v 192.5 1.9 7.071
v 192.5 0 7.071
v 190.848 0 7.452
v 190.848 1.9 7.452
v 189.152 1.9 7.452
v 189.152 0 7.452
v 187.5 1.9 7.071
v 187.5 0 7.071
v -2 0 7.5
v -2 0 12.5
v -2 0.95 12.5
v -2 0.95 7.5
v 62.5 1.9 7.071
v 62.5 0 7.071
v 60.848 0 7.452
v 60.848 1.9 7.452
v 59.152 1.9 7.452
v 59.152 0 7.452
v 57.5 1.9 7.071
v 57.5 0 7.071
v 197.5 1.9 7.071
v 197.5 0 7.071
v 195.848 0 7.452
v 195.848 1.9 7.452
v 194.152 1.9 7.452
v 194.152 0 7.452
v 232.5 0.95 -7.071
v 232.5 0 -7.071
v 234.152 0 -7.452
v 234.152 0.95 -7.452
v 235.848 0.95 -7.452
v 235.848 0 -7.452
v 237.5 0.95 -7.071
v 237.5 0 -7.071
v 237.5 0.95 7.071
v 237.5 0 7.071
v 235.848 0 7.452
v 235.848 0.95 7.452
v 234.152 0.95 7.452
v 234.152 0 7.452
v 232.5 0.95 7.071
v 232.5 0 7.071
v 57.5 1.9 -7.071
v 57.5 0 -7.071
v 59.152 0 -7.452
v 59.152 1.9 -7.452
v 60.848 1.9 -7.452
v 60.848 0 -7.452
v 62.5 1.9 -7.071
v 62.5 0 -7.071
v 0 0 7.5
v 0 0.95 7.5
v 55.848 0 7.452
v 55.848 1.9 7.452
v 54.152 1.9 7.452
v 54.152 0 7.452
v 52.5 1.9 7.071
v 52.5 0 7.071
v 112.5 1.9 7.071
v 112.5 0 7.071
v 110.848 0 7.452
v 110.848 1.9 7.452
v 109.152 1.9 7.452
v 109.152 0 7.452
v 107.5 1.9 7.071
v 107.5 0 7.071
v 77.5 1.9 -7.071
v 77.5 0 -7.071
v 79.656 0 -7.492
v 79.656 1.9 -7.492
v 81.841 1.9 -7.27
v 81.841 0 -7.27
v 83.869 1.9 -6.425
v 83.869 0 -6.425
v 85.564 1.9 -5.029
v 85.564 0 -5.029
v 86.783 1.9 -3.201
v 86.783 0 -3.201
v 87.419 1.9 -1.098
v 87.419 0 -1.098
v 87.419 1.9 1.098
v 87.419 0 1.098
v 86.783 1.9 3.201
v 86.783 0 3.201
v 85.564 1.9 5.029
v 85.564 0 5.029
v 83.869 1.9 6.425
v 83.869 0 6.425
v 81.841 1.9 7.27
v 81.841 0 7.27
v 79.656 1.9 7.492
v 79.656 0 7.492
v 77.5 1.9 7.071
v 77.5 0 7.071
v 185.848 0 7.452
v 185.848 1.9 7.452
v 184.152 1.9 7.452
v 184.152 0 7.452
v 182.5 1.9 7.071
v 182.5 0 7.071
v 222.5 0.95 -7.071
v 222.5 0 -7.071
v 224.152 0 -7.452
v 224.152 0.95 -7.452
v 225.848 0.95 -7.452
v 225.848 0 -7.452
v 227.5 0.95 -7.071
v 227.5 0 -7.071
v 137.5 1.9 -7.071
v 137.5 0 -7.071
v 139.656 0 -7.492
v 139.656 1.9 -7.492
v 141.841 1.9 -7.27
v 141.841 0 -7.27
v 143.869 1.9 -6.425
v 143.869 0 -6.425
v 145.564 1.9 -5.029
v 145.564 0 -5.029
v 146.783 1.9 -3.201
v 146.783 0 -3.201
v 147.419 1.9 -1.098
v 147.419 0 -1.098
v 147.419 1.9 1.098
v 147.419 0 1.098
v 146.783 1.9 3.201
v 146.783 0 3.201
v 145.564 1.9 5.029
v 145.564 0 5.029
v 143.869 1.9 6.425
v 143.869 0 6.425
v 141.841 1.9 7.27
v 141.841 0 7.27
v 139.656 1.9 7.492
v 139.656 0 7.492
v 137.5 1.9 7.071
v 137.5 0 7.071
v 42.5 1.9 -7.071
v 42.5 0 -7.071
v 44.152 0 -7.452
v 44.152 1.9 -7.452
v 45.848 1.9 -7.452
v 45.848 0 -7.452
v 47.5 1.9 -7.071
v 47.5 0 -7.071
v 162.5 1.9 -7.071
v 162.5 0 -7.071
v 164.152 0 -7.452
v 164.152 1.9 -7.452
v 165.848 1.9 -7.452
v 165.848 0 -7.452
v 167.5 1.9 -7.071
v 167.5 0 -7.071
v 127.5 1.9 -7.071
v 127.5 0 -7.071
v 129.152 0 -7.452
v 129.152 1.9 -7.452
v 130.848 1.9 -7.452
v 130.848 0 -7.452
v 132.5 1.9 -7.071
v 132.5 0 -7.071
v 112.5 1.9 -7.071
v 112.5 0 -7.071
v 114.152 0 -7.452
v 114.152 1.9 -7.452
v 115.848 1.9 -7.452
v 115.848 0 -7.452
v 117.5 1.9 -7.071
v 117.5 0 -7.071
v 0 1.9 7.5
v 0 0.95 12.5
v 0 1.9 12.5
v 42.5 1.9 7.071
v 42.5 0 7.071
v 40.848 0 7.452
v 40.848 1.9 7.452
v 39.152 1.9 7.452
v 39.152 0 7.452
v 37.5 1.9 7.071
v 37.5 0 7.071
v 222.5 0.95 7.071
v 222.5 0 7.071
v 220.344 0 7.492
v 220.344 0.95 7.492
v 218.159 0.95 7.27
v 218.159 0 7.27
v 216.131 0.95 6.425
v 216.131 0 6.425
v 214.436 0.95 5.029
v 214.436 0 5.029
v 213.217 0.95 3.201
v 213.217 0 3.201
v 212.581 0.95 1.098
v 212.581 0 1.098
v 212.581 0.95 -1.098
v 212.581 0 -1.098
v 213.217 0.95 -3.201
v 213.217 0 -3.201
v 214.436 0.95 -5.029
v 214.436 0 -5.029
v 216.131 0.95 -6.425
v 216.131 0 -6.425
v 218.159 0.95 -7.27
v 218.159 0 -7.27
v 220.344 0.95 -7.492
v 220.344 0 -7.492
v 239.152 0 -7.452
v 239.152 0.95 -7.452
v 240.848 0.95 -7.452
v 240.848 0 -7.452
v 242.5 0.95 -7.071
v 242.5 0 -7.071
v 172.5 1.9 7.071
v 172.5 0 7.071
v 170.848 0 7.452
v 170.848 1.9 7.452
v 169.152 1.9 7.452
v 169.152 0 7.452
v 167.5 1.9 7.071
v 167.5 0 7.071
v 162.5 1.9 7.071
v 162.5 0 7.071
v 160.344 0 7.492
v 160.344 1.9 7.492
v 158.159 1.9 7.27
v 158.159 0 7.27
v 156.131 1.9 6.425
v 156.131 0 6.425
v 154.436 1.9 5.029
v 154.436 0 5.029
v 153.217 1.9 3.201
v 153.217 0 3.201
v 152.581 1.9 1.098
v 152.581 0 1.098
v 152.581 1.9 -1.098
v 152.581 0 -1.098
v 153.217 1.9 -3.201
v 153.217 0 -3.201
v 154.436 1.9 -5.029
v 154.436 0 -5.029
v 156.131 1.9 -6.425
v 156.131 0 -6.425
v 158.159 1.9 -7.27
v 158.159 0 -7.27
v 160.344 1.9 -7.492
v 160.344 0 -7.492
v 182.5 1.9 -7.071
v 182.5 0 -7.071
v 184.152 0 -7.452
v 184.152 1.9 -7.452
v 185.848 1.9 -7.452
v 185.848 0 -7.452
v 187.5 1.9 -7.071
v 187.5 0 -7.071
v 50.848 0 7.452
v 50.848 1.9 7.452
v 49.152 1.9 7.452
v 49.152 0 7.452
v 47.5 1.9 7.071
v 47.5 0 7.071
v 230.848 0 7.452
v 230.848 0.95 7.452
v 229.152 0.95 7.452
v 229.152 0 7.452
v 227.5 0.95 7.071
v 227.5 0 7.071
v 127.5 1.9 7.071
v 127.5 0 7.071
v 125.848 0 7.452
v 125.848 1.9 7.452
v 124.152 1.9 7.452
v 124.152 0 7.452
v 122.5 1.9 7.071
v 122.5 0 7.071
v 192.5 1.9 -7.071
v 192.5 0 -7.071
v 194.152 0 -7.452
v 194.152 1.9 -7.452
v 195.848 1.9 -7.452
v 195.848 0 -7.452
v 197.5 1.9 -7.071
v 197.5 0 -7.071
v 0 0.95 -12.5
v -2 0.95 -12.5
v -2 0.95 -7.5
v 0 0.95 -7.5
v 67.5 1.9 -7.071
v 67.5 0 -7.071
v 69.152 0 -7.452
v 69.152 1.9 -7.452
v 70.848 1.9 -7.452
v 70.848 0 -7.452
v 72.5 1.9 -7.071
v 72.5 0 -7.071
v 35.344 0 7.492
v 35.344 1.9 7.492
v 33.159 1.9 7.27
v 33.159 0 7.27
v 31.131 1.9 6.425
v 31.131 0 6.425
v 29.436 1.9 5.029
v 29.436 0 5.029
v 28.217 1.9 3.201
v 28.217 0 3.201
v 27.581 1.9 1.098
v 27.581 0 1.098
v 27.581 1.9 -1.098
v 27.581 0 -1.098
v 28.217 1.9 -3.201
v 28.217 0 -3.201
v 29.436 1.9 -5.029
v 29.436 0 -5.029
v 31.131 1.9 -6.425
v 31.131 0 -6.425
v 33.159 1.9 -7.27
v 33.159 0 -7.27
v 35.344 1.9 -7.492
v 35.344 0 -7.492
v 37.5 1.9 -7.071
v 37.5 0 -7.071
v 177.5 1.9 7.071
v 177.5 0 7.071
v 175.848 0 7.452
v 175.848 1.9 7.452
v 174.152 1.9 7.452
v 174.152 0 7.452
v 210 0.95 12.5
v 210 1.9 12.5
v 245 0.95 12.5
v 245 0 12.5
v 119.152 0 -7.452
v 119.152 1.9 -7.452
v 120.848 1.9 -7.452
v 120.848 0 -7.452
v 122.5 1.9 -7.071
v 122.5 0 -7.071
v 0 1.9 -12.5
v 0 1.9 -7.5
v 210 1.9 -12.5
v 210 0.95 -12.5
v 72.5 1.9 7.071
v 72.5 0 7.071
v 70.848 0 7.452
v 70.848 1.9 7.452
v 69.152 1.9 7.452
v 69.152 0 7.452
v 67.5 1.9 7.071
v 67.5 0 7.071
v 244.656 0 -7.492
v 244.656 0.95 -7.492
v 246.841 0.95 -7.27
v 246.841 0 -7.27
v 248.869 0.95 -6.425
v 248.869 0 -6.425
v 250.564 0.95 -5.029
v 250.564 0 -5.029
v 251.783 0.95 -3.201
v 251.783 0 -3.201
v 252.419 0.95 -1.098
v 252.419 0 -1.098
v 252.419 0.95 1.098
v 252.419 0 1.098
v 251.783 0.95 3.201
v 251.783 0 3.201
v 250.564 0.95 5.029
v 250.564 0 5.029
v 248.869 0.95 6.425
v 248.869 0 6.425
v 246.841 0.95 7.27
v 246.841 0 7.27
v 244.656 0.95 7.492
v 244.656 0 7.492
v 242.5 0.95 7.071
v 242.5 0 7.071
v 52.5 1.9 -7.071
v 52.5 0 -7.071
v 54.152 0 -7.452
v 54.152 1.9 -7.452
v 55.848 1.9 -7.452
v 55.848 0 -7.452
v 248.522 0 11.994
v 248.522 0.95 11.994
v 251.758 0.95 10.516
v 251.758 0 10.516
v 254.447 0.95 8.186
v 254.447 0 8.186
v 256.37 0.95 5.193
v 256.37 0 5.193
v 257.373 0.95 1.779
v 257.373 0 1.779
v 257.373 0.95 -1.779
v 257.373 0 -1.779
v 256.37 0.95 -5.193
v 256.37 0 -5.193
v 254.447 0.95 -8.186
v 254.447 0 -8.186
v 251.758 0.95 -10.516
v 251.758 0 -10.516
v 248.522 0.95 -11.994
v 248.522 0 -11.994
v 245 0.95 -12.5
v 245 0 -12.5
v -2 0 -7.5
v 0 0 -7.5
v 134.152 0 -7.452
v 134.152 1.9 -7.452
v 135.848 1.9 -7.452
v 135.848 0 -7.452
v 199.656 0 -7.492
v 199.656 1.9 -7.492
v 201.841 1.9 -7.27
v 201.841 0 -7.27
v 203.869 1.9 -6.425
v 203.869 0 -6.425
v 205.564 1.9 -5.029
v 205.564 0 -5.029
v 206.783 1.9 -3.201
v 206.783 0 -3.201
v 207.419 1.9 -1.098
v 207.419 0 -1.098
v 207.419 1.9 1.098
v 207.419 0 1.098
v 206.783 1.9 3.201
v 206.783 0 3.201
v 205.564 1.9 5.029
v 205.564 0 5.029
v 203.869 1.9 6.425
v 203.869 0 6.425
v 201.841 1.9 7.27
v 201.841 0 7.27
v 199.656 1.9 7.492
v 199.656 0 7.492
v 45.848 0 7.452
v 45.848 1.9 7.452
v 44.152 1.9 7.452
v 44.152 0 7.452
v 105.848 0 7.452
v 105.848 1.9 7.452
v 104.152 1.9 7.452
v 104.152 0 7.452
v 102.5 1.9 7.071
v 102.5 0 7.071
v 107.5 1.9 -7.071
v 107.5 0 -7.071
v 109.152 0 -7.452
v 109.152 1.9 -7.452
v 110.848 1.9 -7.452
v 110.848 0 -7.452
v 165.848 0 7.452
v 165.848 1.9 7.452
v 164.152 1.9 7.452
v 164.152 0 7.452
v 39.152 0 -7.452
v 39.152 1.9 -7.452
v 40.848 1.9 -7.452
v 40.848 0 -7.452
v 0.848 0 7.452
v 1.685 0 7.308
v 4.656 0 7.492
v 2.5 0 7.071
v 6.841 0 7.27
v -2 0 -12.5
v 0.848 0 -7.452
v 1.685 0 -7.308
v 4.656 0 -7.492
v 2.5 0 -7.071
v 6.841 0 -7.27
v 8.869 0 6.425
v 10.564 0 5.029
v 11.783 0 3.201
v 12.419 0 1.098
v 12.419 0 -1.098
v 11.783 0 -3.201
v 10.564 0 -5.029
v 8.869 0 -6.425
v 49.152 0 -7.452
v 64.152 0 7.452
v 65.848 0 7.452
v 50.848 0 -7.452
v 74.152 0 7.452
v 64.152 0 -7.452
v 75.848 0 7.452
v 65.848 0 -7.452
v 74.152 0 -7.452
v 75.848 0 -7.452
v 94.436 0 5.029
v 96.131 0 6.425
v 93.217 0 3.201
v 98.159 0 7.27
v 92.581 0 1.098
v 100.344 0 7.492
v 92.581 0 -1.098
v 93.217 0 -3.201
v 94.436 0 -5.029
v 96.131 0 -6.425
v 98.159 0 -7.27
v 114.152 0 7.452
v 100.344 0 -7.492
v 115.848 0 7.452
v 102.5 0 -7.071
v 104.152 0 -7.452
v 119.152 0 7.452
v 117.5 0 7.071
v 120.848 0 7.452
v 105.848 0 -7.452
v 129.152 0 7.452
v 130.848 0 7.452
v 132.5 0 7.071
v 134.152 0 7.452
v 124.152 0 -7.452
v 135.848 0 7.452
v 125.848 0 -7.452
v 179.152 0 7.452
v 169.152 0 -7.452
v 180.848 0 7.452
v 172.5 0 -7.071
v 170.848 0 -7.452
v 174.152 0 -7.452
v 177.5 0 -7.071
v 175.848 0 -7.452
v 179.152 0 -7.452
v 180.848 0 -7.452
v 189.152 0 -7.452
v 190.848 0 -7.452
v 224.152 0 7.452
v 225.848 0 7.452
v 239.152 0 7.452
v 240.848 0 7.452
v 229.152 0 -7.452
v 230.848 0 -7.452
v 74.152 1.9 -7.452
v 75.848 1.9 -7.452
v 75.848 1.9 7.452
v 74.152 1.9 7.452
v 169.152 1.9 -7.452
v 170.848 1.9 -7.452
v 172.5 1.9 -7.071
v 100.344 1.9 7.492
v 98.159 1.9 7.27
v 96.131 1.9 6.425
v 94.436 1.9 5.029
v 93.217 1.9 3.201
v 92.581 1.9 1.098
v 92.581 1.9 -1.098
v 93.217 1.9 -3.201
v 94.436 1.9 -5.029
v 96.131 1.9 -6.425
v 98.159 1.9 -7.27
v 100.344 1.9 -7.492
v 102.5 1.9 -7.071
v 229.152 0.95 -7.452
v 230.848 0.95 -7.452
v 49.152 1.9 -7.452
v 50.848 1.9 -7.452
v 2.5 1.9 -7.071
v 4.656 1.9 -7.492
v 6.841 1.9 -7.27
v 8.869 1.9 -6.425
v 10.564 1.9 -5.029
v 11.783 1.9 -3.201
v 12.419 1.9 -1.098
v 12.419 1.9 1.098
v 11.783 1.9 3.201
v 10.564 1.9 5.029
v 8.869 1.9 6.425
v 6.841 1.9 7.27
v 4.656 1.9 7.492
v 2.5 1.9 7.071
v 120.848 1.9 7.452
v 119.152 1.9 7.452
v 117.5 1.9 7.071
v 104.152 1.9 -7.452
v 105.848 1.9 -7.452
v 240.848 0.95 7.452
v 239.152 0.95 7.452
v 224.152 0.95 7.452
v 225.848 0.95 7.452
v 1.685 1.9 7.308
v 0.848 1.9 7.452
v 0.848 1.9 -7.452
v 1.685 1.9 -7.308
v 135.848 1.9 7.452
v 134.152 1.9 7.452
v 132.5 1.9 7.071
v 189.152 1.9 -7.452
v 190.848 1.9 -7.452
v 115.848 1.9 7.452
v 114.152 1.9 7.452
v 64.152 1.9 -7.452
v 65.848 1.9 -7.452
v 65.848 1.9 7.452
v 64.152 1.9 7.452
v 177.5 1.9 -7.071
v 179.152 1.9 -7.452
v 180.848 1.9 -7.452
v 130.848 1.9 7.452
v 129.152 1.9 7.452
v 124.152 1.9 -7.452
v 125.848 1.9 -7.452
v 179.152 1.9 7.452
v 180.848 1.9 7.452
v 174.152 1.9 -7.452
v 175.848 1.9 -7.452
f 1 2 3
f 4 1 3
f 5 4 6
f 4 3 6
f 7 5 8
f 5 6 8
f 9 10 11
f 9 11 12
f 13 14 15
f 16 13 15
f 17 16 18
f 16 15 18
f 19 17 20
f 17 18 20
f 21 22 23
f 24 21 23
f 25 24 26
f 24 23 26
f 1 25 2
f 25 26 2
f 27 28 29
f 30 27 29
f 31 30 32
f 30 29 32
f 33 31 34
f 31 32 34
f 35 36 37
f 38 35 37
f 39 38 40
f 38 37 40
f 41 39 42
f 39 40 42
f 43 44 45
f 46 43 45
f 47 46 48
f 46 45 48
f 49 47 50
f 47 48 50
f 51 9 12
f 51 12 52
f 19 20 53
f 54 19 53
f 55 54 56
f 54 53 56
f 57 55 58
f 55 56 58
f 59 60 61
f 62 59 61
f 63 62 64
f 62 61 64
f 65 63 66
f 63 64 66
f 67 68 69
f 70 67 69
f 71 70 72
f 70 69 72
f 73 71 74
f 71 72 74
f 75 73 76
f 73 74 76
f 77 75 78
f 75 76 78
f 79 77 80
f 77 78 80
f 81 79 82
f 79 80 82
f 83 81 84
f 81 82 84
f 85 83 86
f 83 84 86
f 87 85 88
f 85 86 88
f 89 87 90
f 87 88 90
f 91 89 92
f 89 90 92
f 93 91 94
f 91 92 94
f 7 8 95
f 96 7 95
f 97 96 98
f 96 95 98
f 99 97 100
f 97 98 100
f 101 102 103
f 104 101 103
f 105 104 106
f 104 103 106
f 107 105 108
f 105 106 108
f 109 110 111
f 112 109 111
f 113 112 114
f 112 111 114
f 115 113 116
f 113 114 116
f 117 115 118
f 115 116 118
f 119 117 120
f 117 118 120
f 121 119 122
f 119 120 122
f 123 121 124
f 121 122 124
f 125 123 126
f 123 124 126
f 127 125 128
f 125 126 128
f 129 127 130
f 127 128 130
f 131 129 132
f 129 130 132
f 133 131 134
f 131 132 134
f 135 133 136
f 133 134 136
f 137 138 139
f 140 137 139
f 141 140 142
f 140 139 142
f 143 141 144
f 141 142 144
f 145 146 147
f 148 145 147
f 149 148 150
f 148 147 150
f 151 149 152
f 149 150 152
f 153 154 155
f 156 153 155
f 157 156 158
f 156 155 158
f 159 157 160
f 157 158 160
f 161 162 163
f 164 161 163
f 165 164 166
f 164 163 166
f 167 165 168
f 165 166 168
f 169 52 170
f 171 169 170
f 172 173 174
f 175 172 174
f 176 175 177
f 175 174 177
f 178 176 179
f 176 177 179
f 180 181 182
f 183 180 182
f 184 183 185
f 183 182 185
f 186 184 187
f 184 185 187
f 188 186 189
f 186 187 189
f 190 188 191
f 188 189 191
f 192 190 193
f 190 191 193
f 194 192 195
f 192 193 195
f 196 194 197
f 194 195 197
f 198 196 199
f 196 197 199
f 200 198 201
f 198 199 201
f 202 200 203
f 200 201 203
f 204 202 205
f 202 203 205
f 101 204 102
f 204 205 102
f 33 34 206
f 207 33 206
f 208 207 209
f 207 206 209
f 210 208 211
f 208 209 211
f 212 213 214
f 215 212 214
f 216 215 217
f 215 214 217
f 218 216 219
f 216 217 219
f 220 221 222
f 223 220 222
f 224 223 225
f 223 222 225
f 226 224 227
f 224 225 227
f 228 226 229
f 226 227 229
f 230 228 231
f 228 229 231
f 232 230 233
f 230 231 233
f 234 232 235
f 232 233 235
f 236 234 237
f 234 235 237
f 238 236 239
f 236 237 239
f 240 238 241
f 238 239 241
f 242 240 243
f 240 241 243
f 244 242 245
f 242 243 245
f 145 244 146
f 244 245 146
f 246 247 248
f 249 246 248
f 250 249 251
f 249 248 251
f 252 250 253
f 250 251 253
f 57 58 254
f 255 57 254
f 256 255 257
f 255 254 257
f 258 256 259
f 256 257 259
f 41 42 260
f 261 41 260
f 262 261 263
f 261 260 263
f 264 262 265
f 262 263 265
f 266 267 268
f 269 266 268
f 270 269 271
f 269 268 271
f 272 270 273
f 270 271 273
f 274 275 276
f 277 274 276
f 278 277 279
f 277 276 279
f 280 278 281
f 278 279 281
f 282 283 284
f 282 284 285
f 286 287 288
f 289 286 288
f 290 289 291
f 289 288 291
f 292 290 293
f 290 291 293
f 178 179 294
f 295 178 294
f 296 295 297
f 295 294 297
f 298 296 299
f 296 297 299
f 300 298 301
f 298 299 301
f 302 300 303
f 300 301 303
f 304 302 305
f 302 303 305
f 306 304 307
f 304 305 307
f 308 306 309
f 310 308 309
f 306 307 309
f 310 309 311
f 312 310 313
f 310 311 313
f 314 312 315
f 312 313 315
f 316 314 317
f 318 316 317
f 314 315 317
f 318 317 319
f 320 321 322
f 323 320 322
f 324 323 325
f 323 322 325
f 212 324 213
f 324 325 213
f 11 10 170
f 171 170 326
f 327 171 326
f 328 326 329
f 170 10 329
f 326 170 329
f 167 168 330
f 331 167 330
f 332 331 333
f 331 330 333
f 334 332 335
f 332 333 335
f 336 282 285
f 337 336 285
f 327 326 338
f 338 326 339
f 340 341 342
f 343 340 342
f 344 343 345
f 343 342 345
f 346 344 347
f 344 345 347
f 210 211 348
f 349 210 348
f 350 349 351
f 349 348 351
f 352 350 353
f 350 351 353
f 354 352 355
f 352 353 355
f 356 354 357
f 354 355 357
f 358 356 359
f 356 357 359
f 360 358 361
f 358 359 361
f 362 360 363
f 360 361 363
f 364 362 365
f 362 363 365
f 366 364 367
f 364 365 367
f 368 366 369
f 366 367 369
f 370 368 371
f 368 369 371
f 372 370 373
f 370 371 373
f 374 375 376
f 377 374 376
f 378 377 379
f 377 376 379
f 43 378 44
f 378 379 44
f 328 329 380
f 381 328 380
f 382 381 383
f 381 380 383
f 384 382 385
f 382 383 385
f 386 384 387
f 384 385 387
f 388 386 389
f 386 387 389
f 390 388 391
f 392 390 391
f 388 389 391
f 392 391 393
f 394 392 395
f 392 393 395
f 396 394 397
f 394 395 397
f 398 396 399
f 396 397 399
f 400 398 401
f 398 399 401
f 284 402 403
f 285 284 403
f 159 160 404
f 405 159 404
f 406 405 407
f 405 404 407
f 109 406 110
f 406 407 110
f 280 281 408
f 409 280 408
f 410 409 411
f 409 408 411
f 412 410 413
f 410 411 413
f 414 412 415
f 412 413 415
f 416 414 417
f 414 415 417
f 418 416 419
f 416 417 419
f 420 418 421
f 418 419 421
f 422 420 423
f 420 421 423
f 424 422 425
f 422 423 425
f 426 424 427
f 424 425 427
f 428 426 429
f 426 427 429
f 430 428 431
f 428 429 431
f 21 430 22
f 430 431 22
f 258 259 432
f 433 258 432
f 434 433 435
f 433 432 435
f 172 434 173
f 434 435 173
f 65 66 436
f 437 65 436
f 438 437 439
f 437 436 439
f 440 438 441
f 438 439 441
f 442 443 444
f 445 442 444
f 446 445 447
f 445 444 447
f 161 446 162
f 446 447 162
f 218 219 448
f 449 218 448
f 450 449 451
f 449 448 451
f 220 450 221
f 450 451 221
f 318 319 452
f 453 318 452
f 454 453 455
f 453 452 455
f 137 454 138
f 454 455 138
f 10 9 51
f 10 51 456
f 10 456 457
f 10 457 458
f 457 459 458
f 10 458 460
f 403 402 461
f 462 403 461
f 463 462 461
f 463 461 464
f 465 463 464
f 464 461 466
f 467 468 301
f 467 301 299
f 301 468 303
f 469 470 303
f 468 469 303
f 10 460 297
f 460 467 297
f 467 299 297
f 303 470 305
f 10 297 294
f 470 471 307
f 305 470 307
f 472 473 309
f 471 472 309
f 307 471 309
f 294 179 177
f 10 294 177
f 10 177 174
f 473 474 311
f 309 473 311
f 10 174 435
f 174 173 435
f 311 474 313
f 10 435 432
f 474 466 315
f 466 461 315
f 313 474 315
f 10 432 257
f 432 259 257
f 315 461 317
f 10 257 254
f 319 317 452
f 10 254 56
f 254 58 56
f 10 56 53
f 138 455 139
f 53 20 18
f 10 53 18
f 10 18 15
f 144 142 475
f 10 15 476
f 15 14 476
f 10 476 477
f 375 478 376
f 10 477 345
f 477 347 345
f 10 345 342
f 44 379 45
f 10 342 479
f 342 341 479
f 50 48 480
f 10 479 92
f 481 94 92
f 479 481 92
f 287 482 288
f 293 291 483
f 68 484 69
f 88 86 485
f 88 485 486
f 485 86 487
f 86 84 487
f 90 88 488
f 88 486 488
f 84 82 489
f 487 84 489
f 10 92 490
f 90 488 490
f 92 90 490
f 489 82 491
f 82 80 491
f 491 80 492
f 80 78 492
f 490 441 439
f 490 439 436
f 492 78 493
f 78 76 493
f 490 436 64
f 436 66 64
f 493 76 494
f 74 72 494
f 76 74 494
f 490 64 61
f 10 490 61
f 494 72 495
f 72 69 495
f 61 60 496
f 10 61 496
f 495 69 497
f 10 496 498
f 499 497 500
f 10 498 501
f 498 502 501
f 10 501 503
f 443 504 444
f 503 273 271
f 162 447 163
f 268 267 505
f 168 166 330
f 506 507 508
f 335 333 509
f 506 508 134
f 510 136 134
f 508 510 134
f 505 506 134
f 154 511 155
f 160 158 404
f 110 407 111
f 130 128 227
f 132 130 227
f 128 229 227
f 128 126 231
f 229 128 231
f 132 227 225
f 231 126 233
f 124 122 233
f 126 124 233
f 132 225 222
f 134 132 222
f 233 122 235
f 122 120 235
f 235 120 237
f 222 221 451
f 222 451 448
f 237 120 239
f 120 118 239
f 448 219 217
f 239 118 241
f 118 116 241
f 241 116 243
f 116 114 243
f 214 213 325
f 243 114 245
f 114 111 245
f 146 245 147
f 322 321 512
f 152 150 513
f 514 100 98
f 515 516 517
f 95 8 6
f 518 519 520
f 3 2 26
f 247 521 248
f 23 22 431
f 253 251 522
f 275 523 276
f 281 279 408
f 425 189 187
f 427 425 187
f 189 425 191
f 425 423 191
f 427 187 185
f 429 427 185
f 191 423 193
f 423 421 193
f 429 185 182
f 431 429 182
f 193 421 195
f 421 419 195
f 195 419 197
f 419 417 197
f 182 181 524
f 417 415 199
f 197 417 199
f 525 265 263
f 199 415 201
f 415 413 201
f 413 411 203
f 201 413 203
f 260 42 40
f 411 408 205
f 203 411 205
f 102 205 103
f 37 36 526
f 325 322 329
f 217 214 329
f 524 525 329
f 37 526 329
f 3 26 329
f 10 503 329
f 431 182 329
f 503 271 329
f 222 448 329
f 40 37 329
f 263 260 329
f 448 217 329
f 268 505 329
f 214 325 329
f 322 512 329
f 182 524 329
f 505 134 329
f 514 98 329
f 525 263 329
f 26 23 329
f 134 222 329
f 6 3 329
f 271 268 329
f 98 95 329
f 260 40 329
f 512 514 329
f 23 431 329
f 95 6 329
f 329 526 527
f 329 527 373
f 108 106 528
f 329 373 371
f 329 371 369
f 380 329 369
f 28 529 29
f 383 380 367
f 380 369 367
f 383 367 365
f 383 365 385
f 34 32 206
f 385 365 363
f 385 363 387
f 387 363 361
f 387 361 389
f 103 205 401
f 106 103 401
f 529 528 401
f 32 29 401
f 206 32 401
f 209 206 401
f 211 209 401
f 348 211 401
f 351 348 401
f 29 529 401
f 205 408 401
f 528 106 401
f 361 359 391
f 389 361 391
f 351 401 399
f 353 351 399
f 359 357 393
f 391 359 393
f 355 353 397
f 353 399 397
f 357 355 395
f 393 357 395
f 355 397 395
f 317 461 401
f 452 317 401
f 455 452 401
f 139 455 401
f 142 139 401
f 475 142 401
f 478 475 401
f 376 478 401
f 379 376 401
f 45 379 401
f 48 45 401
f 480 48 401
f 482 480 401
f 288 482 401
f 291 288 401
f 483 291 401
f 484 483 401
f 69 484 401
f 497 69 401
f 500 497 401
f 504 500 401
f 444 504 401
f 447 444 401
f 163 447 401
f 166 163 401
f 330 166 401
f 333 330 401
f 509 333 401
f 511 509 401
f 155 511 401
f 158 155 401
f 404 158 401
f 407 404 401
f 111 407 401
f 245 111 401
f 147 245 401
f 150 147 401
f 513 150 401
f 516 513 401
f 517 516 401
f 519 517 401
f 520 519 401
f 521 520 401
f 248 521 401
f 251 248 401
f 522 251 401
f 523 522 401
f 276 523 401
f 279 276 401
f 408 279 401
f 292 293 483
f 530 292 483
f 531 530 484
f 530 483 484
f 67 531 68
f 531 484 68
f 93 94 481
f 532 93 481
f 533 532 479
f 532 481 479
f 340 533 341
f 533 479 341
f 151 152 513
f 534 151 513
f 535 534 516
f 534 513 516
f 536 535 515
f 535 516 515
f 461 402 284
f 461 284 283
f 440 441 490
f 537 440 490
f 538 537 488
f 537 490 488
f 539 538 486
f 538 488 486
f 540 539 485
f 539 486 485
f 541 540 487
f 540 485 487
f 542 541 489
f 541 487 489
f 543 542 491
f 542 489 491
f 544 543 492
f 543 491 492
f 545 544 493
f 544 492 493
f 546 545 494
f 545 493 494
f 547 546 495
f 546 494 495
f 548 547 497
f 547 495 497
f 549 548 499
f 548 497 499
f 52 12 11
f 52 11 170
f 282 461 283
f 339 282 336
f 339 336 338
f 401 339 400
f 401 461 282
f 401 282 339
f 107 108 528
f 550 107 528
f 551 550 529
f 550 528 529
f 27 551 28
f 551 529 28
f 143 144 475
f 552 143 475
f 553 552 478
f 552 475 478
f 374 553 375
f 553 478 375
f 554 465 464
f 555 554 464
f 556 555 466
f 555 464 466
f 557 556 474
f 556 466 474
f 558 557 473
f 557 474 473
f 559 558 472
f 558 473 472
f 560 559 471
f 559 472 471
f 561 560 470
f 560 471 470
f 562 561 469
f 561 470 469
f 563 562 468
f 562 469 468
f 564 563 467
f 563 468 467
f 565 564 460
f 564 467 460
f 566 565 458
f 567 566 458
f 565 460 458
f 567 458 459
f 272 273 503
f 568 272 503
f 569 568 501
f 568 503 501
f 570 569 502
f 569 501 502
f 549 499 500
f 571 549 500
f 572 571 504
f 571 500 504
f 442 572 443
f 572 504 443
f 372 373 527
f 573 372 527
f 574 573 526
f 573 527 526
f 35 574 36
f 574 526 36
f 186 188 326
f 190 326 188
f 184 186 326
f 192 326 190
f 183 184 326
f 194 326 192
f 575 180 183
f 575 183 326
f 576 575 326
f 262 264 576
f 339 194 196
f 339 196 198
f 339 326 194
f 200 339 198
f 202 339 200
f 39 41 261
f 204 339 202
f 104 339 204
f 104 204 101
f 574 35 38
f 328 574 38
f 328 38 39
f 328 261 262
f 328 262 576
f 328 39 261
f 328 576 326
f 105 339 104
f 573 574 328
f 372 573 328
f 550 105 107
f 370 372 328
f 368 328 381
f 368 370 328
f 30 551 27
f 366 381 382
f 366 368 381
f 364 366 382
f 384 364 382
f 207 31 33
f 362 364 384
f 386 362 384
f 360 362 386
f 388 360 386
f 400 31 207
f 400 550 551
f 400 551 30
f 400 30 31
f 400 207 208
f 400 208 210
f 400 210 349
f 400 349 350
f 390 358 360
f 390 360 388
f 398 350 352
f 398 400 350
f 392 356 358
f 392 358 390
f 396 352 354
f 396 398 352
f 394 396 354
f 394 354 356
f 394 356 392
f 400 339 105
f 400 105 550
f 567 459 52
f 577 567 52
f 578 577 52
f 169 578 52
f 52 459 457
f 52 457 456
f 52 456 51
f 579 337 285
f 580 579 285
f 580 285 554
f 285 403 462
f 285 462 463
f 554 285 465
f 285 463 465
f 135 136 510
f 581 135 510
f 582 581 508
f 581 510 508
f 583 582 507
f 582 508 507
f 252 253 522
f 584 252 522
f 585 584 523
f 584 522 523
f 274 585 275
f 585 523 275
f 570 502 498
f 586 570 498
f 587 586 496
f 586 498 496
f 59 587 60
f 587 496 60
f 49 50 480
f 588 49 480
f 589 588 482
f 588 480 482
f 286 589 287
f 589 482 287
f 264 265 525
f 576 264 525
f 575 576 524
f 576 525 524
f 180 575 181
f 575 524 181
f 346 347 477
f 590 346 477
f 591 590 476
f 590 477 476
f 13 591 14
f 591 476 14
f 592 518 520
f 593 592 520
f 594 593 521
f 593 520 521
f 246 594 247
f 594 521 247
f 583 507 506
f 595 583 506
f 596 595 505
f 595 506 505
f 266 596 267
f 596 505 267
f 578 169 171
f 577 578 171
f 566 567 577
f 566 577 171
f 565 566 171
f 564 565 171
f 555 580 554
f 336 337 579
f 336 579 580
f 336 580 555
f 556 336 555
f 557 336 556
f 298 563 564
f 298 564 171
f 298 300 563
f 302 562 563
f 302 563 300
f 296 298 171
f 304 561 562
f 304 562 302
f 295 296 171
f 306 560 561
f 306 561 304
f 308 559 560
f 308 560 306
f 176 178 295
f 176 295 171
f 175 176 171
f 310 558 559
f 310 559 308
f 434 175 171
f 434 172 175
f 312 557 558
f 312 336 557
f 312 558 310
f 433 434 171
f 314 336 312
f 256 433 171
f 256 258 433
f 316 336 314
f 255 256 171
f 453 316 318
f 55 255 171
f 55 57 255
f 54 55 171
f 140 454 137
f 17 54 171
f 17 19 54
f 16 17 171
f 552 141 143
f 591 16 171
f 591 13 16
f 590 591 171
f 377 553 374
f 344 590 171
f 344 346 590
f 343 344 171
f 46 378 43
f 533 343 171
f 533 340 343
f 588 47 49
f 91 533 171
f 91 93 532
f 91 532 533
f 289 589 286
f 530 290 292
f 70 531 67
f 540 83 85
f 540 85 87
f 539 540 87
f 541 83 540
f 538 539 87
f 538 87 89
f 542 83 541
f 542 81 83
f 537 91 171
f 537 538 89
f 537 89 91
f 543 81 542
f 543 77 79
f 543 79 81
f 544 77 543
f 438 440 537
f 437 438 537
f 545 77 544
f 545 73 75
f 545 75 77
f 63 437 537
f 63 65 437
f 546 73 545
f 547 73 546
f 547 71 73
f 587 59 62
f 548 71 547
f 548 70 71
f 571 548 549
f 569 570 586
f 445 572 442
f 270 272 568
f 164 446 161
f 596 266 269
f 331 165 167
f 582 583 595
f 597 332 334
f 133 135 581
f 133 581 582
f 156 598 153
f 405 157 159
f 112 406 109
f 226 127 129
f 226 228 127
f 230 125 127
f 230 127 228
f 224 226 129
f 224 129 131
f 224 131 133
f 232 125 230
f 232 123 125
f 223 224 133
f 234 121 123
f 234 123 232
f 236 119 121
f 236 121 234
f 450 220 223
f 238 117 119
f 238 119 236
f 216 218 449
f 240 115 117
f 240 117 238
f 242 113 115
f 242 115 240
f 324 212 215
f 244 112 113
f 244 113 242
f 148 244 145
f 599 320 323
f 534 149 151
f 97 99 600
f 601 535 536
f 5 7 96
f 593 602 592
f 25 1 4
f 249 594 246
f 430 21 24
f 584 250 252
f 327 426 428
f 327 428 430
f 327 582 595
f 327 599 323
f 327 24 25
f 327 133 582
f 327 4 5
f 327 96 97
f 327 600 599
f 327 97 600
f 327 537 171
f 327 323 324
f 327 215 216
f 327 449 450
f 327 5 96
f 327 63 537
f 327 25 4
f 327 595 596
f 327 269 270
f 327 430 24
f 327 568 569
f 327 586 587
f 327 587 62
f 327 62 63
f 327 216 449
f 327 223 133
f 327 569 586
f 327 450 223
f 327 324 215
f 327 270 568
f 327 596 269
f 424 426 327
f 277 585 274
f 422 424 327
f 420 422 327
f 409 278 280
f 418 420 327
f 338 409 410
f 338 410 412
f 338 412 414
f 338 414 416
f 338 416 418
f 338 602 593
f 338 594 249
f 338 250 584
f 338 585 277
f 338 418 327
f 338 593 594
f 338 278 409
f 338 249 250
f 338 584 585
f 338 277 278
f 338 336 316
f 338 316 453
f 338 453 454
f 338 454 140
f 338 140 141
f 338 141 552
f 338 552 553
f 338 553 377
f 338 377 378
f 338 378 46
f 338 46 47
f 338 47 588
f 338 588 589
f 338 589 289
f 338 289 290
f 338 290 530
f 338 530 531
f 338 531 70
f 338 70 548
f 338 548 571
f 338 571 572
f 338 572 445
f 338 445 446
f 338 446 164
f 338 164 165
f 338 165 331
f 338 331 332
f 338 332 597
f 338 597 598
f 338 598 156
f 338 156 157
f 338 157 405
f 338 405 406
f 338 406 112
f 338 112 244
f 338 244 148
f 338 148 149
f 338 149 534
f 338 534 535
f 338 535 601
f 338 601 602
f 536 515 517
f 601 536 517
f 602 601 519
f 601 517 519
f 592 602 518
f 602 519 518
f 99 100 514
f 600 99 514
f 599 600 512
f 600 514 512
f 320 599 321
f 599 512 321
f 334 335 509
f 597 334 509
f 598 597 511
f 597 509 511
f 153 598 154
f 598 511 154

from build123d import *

# Parameters (mm, degrees)
BOSS_EXTRUDE1_DEPTH = 1.9
BOSS_EXTRUDE3_DEPTH = 0.95
SKETCH2_W           = 2
SKETCH2_H           = 5
BOSS_EXTRUDE2_DEPTH = 0.95


with BuildPart() as part:
    # Sketch1 → Boss-Extrude1 (new body)
    with BuildSketch(Plane(origin=(0, 0, 0), x_dir=(1, 0, 0), z_dir=(0, 1, 0))):
        with BuildLine():
            Line((0, -7.5), (0, -12.5))
            Line((0, -12.5), (210, -12.5))
            Line((210, -12.5), (210, 12.5))
            Line((210, 12.5), (0, 12.5))
            Line((0, 12.5), (0, 7.5))
            ThreePointArc((0, 7.5), (1.26826484, 7.391989197), (2.5, 7.071067812))
            ThreePointArc((2.5, 7.071067812), (12.5, 0), (2.5, -7.071067812))
            ThreePointArc((2.5, -7.071067812), (1.26826484, -7.391989197), (0, -7.5))
        make_face()
        with BuildLine():
            ThreePointArc((37.5, 7.071067812), (40, 7.5), (42.5, 7.071067812))
            ThreePointArc((42.5, 7.071067812), (45, 7.5), (47.5, 7.071067812))
            ThreePointArc((47.5, 7.071067812), (50, 7.5), (52.5, 7.071067812))
            ThreePointArc((52.5, 7.071067812), (55, 7.5), (57.5, 7.071067812))
            ThreePointArc((57.5, 7.071067812), (60, 7.5), (62.5, 7.071067812))
            ThreePointArc((62.5, 7.071067812), (65, 7.5), (67.5, 7.071067812))
            ThreePointArc((67.5, 7.071067812), (70, 7.5), (72.5, 7.071067812))
            ThreePointArc((72.5, 7.071067812), (75, 7.5), (77.5, 7.071067812))
            ThreePointArc((77.5, 7.071067812), (87.5, 0), (77.5, -7.071067812))
            ThreePointArc((77.5, -7.071067812), (75, -7.5), (72.5, -7.071067812))
            ThreePointArc((72.5, -7.071067812), (70, -7.5), (67.5, -7.071067812))
            ThreePointArc((67.5, -7.071067812), (65, -7.5), (62.5, -7.071067812))
            ThreePointArc((62.5, -7.071067812), (60, -7.5), (57.5, -7.071067812))
            ThreePointArc((57.5, -7.071067812), (55, -7.5), (52.5, -7.071067812))
            ThreePointArc((52.5, -7.071067812), (50, -7.5), (47.5, -7.071067812))
            ThreePointArc((47.5, -7.071067812), (45, -7.5), (42.5, -7.071067812))
            ThreePointArc((42.5, -7.071067812), (40, -7.5), (37.5, -7.071067812))
            ThreePointArc((37.5, -7.071067812), (27.5, 0), (37.5, 7.071067812))
        make_face(mode=Mode.SUBTRACT)
        with BuildLine():
            ThreePointArc((102.5, 7.071067812), (105, 7.5), (107.5, 7.071067812))
            ThreePointArc((107.5, 7.071067812), (110, 7.5), (112.5, 7.071067812))
            ThreePointArc((112.5, 7.071067812), (115, 7.5), (117.5, 7.071067812))
            ThreePointArc((117.5, 7.071067812), (120, 7.5), (122.5, 7.071067812))
            ThreePointArc((122.5, 7.071067812), (125, 7.5), (127.5, 7.071067812))
            ThreePointArc((127.5, 7.071067812), (130, 7.5), (132.5, 7.071067812))
            ThreePointArc((132.5, 7.071067812), (135, 7.5), (137.5, 7.071067812))
            ThreePointArc((137.5, 7.071067812), (147.5, 0), (137.5, -7.071067812))
            ThreePointArc((137.5, -7.071067812), (135, -7.5), (132.5, -7.071067812))
            ThreePointArc((132.5, -7.071067812), (130, -7.5), (127.5, -7.071067812))
            ThreePointArc((127.5, -7.071067812), (125, -7.5), (122.5, -7.071067812))
            ThreePointArc((122.5, -7.071067812), (120, -7.5), (117.5, -7.071067812))
            ThreePointArc((117.5, -7.071067812), (115, -7.5), (112.5, -7.071067812))
            ThreePointArc((112.5, -7.071067812), (110, -7.5), (107.5, -7.071067812))
            ThreePointArc((107.5, -7.071067812), (105, -7.5), (102.5, -7.071067812))
            ThreePointArc((102.5, -7.071067812), (92.5, 0), (102.5, 7.071067812))
        make_face(mode=Mode.SUBTRACT)
        with BuildLine():
            ThreePointArc((162.5, 7.071067812), (165, 7.5), (167.5, 7.071067812))
            ThreePointArc((167.5, 7.071067812), (170, 7.5), (172.5, 7.071067812))
            ThreePointArc((172.5, 7.071067812), (175, 7.5), (177.5, 7.071067812))
            ThreePointArc((177.5, 7.071067812), (180, 7.5), (182.5, 7.071067812))
            ThreePointArc((182.5, 7.071067812), (185, 7.5), (187.5, 7.071067812))
            ThreePointArc((187.5, 7.071067812), (190, 7.5), (192.5, 7.071067812))
            ThreePointArc((192.5, 7.071067812), (195, 7.5), (197.5, 7.071067812))
            ThreePointArc((197.5, 7.071067812), (207.5, 0), (197.5, -7.071067812))
            ThreePointArc((197.5, -7.071067812), (195, -7.5), (192.5, -7.071067812))
            ThreePointArc((192.5, -7.071067812), (190, -7.5), (187.5, -7.071067812))
            ThreePointArc((187.5, -7.071067812), (185, -7.5), (182.5, -7.071067812))
            ThreePointArc((182.5, -7.071067812), (180, -7.5), (177.5, -7.071067812))
            ThreePointArc((177.5, -7.071067812), (175, -7.5), (172.5, -7.071067812))
            ThreePointArc((172.5, -7.071067812), (170, -7.5), (167.5, -7.071067812))
            ThreePointArc((167.5, -7.071067812), (165, -7.5), (162.5, -7.071067812))
            ThreePointArc((162.5, -7.071067812), (152.5, 0), (162.5, 7.071067812))
        make_face(mode=Mode.SUBTRACT)
    extrude(amount=BOSS_EXTRUDE1_DEPTH)

    # Sketch1<3> → Boss-Extrude3 (add)
    with BuildSketch(Plane(origin=(0, 0, 0), x_dir=(1, 0, 0), z_dir=(0, 1, 0))):
        with BuildLine():
            Line((210, -12.5), (245, -12.5))
            ThreePointArc((245, -12.5), (257.5, 0), (245, 12.5))
            Line((245, 12.5), (210, 12.5))
            Line((210, 12.5), (210, -12.5))
        make_face()
        with BuildLine():
            ThreePointArc((222.5, -7.071067812), (212.5, 0), (222.5, 7.071067812))
            ThreePointArc((222.5, 7.071067812), (225, 7.5), (227.5, 7.071067812))
            ThreePointArc((227.5, 7.071067812), (230, 7.5), (232.5, 7.071067812))
            ThreePointArc((232.5, 7.071067812), (235, 7.5), (237.5, 7.071067812))
            ThreePointArc((237.5, 7.071067812), (240, 7.5), (242.5, 7.071067812))
            ThreePointArc((242.5, 7.071067812), (252.5, 0), (242.5, -7.071067812))
            ThreePointArc((242.5, -7.071067812), (240, -7.5), (237.5, -7.071067812))
            ThreePointArc((237.5, -7.071067812), (235, -7.5), (232.5, -7.071067812))
            ThreePointArc((232.5, -7.071067812), (230, -7.5), (227.5, -7.071067812))
            ThreePointArc((227.5, -7.071067812), (225, -7.5), (222.5, -7.071067812))
        make_face(mode=Mode.SUBTRACT)
    extrude(amount=BOSS_EXTRUDE3_DEPTH)

    # Sketch2 → Boss-Extrude2 (add)
    with BuildSketch(Plane(origin=(0, 0, 0), x_dir=(1, 0, 0), z_dir=(0, 1, 0))):
        with Locations((-1, 10)):
            Rectangle(SKETCH2_W, SKETCH2_H)
        with Locations((-1, -10)):
            Rectangle(SKETCH2_W, SKETCH2_H)
    extrude(amount=BOSS_EXTRUDE2_DEPTH)


solid = part.part
